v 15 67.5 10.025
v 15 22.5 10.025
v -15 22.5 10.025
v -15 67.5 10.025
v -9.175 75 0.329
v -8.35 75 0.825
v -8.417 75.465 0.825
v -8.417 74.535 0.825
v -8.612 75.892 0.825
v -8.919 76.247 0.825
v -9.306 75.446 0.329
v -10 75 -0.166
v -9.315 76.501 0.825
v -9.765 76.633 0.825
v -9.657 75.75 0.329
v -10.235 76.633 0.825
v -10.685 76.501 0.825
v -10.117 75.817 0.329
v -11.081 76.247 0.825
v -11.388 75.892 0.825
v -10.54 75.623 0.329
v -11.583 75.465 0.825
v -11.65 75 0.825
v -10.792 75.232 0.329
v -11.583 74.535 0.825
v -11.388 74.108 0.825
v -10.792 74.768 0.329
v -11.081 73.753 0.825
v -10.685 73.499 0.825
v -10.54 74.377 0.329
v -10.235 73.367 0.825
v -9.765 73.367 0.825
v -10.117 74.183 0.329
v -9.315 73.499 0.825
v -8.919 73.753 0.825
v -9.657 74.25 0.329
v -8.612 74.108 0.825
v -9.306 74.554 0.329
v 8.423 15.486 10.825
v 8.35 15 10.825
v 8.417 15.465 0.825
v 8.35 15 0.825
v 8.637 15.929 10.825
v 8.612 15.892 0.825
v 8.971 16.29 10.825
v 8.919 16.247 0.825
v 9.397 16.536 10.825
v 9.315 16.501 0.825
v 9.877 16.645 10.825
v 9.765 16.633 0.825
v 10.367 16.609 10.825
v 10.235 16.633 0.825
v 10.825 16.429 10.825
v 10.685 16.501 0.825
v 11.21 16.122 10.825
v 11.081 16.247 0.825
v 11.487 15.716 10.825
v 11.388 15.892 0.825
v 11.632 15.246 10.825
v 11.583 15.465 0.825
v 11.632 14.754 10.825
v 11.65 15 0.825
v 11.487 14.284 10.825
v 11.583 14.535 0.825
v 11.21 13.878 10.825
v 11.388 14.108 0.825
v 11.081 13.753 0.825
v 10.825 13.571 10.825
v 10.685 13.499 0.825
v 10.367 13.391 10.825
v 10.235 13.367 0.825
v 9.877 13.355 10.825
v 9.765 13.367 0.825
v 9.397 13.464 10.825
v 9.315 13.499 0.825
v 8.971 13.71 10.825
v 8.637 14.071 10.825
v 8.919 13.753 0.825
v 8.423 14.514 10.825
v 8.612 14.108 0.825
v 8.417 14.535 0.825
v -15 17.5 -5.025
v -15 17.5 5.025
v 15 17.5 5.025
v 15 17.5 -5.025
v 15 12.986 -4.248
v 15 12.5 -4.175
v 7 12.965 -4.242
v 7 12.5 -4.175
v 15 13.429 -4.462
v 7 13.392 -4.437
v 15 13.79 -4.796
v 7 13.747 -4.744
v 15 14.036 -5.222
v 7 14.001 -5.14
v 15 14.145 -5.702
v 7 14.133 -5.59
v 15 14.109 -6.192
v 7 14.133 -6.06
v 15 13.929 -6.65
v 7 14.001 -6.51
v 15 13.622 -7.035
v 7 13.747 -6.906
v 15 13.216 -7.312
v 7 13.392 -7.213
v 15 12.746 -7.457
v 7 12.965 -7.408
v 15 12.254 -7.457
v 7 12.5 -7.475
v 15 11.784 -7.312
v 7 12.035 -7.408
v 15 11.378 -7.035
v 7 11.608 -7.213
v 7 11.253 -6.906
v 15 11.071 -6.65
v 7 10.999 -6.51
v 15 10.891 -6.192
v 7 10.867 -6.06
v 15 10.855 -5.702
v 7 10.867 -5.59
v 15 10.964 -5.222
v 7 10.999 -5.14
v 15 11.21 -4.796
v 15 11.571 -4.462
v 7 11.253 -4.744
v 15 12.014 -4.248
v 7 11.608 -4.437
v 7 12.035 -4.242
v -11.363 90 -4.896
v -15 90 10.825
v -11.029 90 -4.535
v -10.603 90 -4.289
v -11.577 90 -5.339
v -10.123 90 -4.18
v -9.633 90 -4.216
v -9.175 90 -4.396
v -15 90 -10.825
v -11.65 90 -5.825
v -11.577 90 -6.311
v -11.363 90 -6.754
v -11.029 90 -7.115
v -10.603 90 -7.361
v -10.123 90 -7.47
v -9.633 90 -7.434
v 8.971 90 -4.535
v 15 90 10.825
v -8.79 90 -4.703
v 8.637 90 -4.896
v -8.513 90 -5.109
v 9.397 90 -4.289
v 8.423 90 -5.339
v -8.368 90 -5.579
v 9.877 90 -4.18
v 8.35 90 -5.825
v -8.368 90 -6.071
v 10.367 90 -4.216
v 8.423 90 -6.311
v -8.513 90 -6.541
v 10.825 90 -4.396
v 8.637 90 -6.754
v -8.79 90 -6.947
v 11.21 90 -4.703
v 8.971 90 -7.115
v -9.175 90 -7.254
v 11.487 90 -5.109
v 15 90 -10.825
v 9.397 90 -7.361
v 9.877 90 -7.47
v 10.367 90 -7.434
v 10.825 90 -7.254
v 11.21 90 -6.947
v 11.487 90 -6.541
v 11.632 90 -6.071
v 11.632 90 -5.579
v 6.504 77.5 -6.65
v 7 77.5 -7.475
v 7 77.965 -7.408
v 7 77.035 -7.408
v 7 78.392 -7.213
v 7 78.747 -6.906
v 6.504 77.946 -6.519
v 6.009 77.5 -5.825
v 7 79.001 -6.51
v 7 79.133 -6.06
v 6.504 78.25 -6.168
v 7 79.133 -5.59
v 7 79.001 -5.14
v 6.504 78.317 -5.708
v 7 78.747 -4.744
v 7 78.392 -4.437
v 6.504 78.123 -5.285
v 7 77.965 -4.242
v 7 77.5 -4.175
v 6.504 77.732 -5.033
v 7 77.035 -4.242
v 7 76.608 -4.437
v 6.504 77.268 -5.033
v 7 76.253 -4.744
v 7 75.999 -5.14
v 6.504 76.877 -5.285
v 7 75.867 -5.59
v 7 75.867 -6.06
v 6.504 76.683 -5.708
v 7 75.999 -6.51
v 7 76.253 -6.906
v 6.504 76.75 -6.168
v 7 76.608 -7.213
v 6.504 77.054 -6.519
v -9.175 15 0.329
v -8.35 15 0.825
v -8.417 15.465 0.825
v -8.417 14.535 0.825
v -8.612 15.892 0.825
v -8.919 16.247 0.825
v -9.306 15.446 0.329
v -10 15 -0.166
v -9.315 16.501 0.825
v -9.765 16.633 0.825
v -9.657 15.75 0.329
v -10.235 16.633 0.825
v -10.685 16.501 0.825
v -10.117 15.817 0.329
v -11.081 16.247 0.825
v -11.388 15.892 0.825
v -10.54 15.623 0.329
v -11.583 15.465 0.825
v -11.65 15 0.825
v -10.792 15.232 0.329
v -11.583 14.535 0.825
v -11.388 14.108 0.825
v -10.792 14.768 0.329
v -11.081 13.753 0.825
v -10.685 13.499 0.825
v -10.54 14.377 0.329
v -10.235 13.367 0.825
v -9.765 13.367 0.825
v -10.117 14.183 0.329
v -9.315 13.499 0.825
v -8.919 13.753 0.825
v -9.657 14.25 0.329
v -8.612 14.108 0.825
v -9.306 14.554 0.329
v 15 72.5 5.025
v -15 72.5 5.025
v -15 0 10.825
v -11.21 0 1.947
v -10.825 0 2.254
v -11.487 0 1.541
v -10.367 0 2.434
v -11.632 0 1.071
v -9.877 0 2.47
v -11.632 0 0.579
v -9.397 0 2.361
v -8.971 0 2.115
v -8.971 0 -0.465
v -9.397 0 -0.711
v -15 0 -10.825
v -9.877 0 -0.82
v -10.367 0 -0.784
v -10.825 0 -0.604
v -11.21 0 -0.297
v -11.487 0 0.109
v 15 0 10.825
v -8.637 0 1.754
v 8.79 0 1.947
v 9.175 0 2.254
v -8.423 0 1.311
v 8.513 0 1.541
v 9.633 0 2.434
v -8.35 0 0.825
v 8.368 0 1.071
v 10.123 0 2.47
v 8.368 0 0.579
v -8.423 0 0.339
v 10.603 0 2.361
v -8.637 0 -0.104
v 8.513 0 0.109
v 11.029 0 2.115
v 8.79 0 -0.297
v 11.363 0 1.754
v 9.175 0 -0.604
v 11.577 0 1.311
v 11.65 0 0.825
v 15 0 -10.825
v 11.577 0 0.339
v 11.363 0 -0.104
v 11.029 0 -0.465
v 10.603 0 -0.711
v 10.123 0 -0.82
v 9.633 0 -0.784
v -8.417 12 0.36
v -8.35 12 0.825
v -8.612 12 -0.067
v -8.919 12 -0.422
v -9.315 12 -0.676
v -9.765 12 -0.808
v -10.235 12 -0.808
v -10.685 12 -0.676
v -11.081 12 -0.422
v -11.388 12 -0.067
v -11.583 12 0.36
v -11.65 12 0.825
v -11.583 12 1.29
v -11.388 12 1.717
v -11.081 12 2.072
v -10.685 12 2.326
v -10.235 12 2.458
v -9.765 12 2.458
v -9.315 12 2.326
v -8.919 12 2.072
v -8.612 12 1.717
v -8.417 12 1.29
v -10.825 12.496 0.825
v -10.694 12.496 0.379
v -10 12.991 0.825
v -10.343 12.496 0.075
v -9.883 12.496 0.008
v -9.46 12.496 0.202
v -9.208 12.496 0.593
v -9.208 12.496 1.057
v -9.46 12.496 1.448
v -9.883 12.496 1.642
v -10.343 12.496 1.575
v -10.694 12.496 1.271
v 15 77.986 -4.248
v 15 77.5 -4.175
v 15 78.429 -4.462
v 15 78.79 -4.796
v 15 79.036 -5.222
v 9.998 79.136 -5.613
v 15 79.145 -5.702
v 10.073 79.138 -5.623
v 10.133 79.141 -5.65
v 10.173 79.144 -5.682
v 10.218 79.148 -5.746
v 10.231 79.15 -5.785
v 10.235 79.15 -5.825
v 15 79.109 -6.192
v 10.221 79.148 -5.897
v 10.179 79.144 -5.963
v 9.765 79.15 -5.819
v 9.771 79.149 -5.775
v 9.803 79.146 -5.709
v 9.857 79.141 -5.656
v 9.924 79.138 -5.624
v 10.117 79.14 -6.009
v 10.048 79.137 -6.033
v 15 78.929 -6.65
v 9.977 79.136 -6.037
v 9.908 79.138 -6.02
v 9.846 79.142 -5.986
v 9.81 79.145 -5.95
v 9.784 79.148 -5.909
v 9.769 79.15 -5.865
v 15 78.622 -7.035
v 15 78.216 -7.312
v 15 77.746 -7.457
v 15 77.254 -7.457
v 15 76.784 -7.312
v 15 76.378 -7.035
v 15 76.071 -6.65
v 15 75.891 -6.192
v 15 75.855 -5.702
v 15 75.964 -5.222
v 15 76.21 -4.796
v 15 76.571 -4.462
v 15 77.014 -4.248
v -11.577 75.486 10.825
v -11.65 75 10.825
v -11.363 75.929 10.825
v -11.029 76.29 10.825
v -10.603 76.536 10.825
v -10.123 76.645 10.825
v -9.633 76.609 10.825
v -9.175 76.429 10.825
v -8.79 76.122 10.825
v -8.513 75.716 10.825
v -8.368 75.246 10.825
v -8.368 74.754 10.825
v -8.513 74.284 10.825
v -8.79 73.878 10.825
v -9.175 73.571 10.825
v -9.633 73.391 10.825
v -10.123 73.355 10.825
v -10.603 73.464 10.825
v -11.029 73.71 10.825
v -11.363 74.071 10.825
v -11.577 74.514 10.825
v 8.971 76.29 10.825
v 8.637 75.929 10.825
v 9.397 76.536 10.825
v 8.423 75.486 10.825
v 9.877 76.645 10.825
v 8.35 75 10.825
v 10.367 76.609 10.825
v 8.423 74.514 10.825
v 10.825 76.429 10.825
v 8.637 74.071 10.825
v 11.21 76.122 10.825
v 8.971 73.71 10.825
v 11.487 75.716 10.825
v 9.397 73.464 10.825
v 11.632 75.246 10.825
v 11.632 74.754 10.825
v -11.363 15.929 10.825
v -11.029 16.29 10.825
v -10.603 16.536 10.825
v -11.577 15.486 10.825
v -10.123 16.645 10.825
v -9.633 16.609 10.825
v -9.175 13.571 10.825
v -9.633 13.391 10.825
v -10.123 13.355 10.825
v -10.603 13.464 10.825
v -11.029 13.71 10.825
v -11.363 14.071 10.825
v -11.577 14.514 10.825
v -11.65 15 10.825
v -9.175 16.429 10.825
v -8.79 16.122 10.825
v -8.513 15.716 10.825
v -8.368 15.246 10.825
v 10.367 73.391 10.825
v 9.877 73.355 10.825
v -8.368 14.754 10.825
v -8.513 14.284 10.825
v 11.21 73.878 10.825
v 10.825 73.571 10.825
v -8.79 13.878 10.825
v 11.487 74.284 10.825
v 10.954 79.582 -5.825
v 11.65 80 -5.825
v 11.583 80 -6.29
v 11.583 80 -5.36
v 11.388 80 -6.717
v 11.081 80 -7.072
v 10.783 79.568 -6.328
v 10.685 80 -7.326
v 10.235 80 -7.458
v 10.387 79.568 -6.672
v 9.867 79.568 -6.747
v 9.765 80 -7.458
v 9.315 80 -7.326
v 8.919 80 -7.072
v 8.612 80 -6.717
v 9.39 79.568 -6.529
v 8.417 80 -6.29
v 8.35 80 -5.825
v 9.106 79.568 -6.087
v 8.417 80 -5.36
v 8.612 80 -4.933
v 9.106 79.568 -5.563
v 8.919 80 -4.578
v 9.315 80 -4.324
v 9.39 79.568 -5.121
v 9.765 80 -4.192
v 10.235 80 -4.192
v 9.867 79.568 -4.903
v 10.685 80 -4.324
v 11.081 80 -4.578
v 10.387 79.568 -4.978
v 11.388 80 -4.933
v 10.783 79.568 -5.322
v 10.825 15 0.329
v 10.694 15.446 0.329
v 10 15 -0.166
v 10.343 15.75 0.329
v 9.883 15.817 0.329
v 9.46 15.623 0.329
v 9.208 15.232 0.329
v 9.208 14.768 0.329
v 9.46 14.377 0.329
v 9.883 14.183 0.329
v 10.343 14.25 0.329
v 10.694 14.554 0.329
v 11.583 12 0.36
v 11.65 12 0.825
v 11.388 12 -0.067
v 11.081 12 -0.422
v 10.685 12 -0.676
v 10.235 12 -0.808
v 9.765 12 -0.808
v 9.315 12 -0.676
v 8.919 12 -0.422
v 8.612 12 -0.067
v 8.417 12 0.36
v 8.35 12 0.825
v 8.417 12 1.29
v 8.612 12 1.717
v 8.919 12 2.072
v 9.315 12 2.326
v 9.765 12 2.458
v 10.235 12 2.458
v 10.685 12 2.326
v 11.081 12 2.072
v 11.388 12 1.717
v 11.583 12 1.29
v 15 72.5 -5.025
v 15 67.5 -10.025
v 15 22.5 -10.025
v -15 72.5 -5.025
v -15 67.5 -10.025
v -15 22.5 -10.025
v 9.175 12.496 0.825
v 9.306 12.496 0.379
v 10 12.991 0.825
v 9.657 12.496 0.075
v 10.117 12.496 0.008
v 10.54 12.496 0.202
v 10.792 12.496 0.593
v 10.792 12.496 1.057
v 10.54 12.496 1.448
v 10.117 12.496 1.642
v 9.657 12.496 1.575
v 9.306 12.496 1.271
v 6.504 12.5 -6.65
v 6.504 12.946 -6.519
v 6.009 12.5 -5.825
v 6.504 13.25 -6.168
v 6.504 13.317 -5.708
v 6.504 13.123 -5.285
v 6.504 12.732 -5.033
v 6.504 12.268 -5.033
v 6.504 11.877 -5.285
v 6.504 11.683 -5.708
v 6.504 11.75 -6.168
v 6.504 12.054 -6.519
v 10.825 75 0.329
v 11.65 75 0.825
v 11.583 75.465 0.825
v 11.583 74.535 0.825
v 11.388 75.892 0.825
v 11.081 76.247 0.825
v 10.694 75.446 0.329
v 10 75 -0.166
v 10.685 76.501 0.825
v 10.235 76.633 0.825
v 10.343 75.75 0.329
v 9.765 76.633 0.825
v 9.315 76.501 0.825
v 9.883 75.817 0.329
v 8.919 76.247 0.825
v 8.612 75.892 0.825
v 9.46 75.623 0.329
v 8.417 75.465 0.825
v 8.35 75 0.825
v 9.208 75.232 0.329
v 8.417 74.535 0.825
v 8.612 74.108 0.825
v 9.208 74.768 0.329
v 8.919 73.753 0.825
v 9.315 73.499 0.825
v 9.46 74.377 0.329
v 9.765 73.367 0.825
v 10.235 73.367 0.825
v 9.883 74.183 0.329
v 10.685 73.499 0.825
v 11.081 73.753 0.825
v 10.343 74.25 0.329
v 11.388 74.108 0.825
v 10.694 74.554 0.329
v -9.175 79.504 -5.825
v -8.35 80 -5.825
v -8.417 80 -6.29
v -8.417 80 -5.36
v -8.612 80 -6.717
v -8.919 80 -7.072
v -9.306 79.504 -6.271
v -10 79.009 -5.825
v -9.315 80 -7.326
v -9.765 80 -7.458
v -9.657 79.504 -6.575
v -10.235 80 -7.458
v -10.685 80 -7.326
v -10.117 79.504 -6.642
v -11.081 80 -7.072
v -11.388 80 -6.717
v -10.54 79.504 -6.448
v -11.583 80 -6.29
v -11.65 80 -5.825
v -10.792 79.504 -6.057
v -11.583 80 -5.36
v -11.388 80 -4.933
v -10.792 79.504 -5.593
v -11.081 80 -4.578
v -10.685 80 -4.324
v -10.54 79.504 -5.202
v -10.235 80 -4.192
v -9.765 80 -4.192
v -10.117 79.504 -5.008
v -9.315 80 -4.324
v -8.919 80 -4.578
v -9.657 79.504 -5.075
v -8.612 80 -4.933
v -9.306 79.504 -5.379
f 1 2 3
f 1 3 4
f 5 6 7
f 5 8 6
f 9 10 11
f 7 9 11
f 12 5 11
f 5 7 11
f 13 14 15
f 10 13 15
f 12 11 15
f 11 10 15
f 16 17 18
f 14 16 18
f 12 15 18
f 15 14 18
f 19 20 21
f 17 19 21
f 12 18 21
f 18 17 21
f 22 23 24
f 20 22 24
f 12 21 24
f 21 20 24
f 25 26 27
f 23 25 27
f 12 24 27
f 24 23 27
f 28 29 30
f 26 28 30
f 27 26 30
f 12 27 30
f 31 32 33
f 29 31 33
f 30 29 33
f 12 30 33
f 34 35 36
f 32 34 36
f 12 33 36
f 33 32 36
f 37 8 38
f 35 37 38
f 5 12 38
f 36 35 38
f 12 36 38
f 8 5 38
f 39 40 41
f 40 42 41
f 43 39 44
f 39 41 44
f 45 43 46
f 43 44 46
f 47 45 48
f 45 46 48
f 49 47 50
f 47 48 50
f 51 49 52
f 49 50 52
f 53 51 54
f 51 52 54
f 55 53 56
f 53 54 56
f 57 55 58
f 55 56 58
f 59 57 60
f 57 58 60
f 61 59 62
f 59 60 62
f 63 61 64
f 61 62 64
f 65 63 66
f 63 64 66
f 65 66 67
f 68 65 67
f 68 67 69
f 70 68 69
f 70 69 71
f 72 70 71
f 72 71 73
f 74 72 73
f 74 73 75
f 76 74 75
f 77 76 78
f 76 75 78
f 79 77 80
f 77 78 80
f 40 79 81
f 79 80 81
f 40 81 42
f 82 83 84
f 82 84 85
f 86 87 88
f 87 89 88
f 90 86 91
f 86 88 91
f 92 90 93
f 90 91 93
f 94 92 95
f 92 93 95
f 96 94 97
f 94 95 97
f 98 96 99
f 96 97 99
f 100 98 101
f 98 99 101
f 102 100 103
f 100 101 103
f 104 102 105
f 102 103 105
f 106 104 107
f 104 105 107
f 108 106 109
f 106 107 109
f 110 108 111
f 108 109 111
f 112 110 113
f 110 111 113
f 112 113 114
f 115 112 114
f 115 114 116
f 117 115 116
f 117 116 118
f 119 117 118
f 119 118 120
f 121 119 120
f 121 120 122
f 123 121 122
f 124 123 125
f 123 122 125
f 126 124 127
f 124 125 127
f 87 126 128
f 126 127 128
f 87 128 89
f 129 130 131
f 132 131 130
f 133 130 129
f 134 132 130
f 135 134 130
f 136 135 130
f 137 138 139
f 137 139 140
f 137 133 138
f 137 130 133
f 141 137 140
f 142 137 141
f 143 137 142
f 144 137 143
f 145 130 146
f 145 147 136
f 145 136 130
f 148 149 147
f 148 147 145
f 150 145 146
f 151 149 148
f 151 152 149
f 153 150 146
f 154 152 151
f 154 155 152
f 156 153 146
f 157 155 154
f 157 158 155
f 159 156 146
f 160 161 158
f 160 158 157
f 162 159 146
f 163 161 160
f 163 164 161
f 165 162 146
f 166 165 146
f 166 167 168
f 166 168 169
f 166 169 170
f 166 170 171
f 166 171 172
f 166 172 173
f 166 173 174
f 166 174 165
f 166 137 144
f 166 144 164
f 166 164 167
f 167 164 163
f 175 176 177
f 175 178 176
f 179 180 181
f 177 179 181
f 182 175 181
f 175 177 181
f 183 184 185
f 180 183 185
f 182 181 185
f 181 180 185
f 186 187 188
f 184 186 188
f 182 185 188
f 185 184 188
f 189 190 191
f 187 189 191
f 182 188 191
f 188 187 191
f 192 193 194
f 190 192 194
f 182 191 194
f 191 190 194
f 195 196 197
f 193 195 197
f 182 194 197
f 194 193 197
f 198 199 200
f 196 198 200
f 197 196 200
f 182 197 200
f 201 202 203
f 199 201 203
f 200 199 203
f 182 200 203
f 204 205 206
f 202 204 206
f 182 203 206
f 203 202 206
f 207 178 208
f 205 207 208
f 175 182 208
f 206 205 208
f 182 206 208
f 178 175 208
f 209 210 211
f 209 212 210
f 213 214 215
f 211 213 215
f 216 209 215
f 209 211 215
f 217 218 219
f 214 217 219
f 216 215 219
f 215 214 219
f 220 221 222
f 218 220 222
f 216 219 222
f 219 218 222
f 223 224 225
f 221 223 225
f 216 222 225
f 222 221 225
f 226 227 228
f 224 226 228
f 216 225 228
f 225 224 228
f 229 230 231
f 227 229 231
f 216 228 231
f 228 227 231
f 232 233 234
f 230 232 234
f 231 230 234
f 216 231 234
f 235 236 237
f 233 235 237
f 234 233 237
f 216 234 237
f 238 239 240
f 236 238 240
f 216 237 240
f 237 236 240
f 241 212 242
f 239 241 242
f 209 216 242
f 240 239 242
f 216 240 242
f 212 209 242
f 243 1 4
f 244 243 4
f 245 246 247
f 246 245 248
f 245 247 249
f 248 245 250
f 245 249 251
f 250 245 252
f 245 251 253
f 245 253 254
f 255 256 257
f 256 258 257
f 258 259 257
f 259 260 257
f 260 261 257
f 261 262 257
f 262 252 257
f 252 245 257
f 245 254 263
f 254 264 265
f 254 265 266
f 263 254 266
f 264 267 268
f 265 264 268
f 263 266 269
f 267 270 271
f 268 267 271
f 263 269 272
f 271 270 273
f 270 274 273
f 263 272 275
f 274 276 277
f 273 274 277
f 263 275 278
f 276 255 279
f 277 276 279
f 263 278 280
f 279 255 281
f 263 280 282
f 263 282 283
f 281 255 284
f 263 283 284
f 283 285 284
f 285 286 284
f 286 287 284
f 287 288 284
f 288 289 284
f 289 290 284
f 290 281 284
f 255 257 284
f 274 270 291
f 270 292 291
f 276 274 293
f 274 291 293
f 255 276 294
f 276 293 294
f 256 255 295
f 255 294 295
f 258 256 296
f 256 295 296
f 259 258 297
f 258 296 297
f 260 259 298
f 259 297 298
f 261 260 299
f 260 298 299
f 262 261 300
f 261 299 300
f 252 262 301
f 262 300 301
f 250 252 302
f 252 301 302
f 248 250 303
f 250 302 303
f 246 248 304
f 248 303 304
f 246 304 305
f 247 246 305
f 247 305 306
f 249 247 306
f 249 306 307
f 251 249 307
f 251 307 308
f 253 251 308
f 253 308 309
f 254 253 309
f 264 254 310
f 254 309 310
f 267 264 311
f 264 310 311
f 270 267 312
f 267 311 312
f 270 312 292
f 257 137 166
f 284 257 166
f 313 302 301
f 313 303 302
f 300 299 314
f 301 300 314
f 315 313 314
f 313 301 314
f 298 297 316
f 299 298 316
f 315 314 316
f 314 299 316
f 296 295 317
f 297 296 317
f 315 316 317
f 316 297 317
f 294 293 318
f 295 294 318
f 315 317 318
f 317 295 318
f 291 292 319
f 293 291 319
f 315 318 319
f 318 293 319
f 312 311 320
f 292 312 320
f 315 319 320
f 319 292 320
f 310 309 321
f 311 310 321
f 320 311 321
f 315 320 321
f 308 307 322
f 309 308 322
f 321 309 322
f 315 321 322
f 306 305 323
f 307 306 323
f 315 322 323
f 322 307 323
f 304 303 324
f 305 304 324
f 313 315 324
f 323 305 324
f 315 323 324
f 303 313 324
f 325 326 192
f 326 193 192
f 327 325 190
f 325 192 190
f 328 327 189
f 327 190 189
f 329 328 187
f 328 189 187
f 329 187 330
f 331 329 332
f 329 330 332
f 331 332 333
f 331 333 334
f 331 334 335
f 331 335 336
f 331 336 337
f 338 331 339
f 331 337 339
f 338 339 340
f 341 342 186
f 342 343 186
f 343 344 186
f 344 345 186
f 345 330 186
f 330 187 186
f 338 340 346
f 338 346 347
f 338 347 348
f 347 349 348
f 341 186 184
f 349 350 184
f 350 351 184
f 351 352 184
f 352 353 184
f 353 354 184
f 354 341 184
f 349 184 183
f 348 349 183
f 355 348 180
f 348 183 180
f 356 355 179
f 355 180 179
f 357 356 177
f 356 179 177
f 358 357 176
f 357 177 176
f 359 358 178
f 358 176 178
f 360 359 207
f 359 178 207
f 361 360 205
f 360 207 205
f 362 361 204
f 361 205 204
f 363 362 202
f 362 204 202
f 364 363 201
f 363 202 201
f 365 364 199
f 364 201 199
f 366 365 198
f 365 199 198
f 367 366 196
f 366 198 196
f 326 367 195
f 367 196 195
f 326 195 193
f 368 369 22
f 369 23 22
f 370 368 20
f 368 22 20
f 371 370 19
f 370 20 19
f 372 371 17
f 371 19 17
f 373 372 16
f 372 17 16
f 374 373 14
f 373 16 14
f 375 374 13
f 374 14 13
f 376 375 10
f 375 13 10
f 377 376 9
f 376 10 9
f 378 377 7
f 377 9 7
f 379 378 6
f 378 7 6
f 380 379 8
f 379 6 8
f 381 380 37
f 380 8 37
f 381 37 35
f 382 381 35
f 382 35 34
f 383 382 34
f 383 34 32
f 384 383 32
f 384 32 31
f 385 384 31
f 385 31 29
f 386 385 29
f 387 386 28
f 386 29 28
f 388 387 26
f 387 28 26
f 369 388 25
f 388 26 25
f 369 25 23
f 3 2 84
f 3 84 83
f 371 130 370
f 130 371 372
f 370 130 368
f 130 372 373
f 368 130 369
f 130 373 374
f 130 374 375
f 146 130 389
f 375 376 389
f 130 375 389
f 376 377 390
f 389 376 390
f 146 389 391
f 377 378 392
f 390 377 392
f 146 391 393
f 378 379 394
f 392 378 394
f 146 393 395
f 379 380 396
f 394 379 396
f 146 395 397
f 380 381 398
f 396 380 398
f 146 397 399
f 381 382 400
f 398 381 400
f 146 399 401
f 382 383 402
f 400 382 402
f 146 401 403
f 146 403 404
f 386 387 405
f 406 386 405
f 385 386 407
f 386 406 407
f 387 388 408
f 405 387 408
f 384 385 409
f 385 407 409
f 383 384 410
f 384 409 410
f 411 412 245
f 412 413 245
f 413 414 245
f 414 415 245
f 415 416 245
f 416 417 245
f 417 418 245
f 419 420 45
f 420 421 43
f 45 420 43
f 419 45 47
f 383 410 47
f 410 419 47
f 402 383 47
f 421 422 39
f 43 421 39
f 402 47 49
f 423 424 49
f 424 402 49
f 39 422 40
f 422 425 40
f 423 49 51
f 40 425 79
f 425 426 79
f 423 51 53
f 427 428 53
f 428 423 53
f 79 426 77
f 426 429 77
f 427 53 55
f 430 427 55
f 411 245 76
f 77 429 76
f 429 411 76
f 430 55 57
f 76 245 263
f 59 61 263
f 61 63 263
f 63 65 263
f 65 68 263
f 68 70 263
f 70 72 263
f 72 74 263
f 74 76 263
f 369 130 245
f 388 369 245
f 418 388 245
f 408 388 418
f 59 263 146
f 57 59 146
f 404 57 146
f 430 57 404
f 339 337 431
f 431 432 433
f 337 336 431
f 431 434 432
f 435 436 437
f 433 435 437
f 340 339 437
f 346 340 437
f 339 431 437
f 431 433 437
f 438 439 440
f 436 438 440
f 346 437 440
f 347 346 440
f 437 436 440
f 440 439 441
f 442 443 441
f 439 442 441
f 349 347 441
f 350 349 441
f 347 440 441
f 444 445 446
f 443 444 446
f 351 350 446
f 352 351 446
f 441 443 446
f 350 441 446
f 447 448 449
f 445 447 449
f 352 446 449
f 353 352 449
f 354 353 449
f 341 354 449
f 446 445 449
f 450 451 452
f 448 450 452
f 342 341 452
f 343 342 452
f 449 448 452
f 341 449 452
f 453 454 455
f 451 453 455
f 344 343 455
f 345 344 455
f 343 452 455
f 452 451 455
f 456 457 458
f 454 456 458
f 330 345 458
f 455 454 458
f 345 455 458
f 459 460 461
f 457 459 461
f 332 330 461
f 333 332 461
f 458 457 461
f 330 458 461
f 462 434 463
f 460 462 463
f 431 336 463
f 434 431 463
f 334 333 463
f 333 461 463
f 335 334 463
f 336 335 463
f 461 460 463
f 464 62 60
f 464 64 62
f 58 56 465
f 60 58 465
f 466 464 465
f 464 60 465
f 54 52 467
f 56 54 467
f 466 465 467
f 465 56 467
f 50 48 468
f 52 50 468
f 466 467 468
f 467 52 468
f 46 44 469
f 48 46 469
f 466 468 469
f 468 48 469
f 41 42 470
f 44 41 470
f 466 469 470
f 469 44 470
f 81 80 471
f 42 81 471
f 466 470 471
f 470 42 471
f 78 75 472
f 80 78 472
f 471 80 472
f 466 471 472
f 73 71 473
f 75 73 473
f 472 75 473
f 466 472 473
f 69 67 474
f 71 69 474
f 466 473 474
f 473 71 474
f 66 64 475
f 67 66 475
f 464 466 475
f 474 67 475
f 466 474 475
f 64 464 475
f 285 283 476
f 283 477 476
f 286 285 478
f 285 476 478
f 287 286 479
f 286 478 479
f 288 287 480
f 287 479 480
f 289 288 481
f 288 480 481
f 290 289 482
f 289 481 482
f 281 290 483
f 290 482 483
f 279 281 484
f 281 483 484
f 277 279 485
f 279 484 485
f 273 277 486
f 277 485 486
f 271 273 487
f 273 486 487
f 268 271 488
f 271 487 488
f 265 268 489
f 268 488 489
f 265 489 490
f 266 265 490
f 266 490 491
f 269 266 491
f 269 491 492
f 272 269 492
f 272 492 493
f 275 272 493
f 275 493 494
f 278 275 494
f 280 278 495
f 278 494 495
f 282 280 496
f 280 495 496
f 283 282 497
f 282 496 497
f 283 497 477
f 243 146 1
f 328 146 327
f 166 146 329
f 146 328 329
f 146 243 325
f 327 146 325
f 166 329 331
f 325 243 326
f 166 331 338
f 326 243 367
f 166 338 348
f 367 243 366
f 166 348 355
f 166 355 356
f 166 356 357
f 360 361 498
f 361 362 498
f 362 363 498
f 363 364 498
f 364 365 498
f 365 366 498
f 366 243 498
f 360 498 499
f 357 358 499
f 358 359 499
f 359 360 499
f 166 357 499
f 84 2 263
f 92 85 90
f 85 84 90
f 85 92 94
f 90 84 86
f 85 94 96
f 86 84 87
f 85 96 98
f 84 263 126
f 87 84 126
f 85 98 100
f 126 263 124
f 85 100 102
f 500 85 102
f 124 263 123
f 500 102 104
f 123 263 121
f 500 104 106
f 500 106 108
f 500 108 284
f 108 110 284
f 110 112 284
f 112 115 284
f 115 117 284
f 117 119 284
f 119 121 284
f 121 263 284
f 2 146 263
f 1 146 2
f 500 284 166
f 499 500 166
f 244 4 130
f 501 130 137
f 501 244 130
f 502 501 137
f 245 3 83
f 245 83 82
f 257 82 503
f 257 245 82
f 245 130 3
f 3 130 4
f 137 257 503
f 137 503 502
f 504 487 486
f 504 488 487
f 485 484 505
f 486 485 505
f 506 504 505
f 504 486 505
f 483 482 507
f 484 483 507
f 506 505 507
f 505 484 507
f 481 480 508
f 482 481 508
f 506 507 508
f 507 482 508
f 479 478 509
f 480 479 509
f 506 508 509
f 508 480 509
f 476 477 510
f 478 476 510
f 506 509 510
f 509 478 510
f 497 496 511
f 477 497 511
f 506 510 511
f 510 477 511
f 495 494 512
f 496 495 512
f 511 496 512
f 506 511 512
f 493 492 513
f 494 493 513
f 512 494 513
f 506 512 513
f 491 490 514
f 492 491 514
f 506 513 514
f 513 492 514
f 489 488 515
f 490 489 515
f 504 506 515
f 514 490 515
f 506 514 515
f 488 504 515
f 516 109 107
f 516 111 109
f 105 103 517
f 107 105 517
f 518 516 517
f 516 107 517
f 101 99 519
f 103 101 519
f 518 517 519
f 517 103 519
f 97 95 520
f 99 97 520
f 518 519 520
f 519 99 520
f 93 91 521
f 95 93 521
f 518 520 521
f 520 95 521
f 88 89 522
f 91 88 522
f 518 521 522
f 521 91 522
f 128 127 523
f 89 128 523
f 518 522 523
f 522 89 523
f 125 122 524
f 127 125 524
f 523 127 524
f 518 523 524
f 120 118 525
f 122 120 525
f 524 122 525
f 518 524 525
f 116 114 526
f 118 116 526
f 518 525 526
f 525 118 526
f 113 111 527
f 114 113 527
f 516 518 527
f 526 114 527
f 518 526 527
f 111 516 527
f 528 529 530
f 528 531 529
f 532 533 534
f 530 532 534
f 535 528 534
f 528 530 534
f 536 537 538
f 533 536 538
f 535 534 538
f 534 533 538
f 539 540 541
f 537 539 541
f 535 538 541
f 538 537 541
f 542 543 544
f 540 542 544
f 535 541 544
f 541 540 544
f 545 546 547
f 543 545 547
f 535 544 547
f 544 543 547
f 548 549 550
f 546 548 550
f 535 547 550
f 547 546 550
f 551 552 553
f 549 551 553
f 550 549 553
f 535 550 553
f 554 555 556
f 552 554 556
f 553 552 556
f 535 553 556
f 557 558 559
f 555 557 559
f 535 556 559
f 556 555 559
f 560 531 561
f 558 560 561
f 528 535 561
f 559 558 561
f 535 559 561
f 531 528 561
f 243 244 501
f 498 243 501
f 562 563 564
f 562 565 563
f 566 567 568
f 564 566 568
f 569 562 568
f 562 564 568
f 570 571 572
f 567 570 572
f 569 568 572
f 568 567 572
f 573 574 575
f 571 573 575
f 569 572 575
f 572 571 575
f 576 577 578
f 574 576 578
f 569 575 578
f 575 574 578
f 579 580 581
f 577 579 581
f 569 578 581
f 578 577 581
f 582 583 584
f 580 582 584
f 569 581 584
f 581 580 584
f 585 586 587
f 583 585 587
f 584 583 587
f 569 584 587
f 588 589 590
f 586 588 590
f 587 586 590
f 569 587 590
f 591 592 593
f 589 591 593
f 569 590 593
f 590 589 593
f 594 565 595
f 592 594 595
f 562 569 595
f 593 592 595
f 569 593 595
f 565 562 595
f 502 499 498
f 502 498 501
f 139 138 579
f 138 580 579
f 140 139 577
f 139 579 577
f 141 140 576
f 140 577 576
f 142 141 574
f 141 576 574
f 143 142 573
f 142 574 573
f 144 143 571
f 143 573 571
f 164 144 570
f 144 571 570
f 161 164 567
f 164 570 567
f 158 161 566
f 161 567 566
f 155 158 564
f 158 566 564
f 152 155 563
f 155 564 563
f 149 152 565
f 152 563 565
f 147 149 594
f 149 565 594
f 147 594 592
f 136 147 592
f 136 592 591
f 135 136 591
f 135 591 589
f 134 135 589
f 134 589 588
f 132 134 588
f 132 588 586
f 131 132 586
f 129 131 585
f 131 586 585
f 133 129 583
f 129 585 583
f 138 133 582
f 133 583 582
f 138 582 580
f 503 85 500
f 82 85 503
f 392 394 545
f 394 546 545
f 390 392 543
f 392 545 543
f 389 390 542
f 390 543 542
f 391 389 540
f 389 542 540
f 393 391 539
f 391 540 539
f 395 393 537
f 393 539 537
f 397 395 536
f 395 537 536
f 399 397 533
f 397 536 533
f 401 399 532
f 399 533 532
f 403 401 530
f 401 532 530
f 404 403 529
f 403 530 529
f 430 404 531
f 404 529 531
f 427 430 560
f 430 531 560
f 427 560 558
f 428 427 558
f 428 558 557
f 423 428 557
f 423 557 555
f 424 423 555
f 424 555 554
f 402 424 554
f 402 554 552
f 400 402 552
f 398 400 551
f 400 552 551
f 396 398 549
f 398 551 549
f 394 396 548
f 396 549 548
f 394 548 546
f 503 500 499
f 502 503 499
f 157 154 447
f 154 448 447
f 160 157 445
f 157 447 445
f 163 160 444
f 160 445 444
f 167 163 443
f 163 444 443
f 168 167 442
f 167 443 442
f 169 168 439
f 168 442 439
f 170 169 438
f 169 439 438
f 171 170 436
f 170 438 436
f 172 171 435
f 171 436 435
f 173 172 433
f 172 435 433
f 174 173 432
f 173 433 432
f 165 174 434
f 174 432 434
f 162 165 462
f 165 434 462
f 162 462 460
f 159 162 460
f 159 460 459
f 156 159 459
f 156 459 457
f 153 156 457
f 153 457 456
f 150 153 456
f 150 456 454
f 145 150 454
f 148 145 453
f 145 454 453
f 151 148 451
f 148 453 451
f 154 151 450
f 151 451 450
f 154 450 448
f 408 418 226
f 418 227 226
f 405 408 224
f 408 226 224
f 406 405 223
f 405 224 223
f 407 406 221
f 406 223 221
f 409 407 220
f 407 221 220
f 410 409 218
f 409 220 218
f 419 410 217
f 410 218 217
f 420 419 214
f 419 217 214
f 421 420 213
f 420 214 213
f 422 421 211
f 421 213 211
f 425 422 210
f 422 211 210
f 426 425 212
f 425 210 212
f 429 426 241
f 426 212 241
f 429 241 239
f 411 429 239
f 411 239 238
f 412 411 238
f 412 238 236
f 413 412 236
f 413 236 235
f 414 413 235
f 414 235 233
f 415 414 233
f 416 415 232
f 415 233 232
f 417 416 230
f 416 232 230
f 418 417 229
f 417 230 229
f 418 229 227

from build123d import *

# Parameters (mm, degrees)
SKETCH1_W                 = 30
SKETCH1_H                 = 21.65
BOSS_EXTRUDE1_DEPTH       = 90
M4X0_7_TAPPED_HOLE1_D     = 3.3
M4X0_7_TAPPED_HOLE1_DEPTH = 10
M4X0_7_TAPPED_HOLE1_TIP   = 0.991420021
M4X0_7_TAPPED_HOLE2_D     = 3.3
M4X0_7_TAPPED_HOLE2_DEPTH = 12
M4X0_7_TAPPED_HOLE2_TIP   = 0.991420021
SKETCH7_W                 = 20.05
SKETCH7_H                 = 55
CUT_EXTRUDE1_DEPTH        = 96.483928622
CHAMFER1_SIZE             = 5
M4X0_7_TAPPED_HOLE3_D     = 3.3
M4X0_7_TAPPED_HOLE3_DEPTH = 10
M4X0_7_TAPPED_HOLE3_TIP   = 0.991420021
M4X0_7_TAPPED_HOLE4_D     = 3.3
M4X0_7_TAPPED_HOLE4_DEPTH = 8
M4X0_7_TAPPED_HOLE4_TIP   = 0.991420021


with BuildPart() as part:
    # Sketch1 → Boss-Extrude1 (new body)
    with BuildSketch(Plane(origin=(0, 0, 0), x_dir=(1, 0, 0), z_dir=(0, 1, 0))):
        Rectangle(SKETCH1_W, SKETCH1_H)
    extrude(amount=BOSS_EXTRUDE1_DEPTH)

    # M4x0.7 Tapped Hole1
    with Locations(Plane(origin=(0, 90, 0), x_dir=(1, 0, 0), z_dir=(0, 1, 0))):
        with Locations((-10, 5.825), (10, 5.825)):
            Hole(M4X0_7_TAPPED_HOLE1_D / 2, depth=M4X0_7_TAPPED_HOLE1_DEPTH)
            with Locations((0, 0, -(M4X0_7_TAPPED_HOLE1_DEPTH + M4X0_7_TAPPED_HOLE1_TIP / 2))):  # 118° drill point
                Cone(0, M4X0_7_TAPPED_HOLE1_D / 2, M4X0_7_TAPPED_HOLE1_TIP, mode=Mode.SUBTRACT)

    # M4x0.7 Tapped Hole2
    with Locations(Plane(origin=(0, 0, 0), x_dir=(-1, 0, 0), z_dir=(0, -1, 0))):
        with Locations((-10, -0.825), (10, -0.825)):
            Hole(M4X0_7_TAPPED_HOLE2_D / 2, depth=M4X0_7_TAPPED_HOLE2_DEPTH)
            with Locations((0, 0, -(M4X0_7_TAPPED_HOLE2_DEPTH + M4X0_7_TAPPED_HOLE2_TIP / 2))):  # 118° drill point
                Cone(0, M4X0_7_TAPPED_HOLE2_D / 2, M4X0_7_TAPPED_HOLE2_TIP, mode=Mode.SUBTRACT)

    # Sketch7 → Cut-Extrude1 (cut, through all)
    with BuildSketch(Plane(origin=(15, 0, 0), x_dir=(0, 0, -1), z_dir=(1, 0, 0))):
        with Locations((0, 45)):
            Rectangle(SKETCH7_W, SKETCH7_H)
    extrude(amount=-CUT_EXTRUDE1_DEPTH, mode=Mode.SUBTRACT)

    # Chamfer1
    chamfer1_edges = [part.edges().sort_by_distance(p)[0] for p in [
        (0, 72.5, -10.025),
        (0, 17.5, -10.025),
        (0, 17.5, 10.025),
        (0, 72.5, 10.025),
    ]]
    chamfer(chamfer1_edges, length=CHAMFER1_SIZE)

    # M4x0.7 Tapped Hole3
    with Locations(Plane.XY.offset(10.825)):
        with Locations((-10, 15), (10, 15), (10, 75), (-10, 75)):
            Hole(M4X0_7_TAPPED_HOLE3_D / 2, depth=M4X0_7_TAPPED_HOLE3_DEPTH)
            with Locations((0, 0, -(M4X0_7_TAPPED_HOLE3_DEPTH + M4X0_7_TAPPED_HOLE3_TIP / 2))):  # 118° drill point
                Cone(0, M4X0_7_TAPPED_HOLE3_D / 2, M4X0_7_TAPPED_HOLE3_TIP, mode=Mode.SUBTRACT)

    # M4x0.7 Tapped Hole4
    with Locations(Plane(origin=(15, 0, 0), x_dir=(0, 0, -1), z_dir=(1, 0, 0))):
        with Locations((5.825, 12.5), (5.825, 77.5)):
            Hole(M4X0_7_TAPPED_HOLE4_D / 2, depth=M4X0_7_TAPPED_HOLE4_DEPTH)
            with Locations((0, 0, -(M4X0_7_TAPPED_HOLE4_DEPTH + M4X0_7_TAPPED_HOLE4_TIP / 2))):  # 118° drill point
                Cone(0, M4X0_7_TAPPED_HOLE4_D / 2, M4X0_7_TAPPED_HOLE4_TIP, mode=Mode.SUBTRACT)


solid = part.part
